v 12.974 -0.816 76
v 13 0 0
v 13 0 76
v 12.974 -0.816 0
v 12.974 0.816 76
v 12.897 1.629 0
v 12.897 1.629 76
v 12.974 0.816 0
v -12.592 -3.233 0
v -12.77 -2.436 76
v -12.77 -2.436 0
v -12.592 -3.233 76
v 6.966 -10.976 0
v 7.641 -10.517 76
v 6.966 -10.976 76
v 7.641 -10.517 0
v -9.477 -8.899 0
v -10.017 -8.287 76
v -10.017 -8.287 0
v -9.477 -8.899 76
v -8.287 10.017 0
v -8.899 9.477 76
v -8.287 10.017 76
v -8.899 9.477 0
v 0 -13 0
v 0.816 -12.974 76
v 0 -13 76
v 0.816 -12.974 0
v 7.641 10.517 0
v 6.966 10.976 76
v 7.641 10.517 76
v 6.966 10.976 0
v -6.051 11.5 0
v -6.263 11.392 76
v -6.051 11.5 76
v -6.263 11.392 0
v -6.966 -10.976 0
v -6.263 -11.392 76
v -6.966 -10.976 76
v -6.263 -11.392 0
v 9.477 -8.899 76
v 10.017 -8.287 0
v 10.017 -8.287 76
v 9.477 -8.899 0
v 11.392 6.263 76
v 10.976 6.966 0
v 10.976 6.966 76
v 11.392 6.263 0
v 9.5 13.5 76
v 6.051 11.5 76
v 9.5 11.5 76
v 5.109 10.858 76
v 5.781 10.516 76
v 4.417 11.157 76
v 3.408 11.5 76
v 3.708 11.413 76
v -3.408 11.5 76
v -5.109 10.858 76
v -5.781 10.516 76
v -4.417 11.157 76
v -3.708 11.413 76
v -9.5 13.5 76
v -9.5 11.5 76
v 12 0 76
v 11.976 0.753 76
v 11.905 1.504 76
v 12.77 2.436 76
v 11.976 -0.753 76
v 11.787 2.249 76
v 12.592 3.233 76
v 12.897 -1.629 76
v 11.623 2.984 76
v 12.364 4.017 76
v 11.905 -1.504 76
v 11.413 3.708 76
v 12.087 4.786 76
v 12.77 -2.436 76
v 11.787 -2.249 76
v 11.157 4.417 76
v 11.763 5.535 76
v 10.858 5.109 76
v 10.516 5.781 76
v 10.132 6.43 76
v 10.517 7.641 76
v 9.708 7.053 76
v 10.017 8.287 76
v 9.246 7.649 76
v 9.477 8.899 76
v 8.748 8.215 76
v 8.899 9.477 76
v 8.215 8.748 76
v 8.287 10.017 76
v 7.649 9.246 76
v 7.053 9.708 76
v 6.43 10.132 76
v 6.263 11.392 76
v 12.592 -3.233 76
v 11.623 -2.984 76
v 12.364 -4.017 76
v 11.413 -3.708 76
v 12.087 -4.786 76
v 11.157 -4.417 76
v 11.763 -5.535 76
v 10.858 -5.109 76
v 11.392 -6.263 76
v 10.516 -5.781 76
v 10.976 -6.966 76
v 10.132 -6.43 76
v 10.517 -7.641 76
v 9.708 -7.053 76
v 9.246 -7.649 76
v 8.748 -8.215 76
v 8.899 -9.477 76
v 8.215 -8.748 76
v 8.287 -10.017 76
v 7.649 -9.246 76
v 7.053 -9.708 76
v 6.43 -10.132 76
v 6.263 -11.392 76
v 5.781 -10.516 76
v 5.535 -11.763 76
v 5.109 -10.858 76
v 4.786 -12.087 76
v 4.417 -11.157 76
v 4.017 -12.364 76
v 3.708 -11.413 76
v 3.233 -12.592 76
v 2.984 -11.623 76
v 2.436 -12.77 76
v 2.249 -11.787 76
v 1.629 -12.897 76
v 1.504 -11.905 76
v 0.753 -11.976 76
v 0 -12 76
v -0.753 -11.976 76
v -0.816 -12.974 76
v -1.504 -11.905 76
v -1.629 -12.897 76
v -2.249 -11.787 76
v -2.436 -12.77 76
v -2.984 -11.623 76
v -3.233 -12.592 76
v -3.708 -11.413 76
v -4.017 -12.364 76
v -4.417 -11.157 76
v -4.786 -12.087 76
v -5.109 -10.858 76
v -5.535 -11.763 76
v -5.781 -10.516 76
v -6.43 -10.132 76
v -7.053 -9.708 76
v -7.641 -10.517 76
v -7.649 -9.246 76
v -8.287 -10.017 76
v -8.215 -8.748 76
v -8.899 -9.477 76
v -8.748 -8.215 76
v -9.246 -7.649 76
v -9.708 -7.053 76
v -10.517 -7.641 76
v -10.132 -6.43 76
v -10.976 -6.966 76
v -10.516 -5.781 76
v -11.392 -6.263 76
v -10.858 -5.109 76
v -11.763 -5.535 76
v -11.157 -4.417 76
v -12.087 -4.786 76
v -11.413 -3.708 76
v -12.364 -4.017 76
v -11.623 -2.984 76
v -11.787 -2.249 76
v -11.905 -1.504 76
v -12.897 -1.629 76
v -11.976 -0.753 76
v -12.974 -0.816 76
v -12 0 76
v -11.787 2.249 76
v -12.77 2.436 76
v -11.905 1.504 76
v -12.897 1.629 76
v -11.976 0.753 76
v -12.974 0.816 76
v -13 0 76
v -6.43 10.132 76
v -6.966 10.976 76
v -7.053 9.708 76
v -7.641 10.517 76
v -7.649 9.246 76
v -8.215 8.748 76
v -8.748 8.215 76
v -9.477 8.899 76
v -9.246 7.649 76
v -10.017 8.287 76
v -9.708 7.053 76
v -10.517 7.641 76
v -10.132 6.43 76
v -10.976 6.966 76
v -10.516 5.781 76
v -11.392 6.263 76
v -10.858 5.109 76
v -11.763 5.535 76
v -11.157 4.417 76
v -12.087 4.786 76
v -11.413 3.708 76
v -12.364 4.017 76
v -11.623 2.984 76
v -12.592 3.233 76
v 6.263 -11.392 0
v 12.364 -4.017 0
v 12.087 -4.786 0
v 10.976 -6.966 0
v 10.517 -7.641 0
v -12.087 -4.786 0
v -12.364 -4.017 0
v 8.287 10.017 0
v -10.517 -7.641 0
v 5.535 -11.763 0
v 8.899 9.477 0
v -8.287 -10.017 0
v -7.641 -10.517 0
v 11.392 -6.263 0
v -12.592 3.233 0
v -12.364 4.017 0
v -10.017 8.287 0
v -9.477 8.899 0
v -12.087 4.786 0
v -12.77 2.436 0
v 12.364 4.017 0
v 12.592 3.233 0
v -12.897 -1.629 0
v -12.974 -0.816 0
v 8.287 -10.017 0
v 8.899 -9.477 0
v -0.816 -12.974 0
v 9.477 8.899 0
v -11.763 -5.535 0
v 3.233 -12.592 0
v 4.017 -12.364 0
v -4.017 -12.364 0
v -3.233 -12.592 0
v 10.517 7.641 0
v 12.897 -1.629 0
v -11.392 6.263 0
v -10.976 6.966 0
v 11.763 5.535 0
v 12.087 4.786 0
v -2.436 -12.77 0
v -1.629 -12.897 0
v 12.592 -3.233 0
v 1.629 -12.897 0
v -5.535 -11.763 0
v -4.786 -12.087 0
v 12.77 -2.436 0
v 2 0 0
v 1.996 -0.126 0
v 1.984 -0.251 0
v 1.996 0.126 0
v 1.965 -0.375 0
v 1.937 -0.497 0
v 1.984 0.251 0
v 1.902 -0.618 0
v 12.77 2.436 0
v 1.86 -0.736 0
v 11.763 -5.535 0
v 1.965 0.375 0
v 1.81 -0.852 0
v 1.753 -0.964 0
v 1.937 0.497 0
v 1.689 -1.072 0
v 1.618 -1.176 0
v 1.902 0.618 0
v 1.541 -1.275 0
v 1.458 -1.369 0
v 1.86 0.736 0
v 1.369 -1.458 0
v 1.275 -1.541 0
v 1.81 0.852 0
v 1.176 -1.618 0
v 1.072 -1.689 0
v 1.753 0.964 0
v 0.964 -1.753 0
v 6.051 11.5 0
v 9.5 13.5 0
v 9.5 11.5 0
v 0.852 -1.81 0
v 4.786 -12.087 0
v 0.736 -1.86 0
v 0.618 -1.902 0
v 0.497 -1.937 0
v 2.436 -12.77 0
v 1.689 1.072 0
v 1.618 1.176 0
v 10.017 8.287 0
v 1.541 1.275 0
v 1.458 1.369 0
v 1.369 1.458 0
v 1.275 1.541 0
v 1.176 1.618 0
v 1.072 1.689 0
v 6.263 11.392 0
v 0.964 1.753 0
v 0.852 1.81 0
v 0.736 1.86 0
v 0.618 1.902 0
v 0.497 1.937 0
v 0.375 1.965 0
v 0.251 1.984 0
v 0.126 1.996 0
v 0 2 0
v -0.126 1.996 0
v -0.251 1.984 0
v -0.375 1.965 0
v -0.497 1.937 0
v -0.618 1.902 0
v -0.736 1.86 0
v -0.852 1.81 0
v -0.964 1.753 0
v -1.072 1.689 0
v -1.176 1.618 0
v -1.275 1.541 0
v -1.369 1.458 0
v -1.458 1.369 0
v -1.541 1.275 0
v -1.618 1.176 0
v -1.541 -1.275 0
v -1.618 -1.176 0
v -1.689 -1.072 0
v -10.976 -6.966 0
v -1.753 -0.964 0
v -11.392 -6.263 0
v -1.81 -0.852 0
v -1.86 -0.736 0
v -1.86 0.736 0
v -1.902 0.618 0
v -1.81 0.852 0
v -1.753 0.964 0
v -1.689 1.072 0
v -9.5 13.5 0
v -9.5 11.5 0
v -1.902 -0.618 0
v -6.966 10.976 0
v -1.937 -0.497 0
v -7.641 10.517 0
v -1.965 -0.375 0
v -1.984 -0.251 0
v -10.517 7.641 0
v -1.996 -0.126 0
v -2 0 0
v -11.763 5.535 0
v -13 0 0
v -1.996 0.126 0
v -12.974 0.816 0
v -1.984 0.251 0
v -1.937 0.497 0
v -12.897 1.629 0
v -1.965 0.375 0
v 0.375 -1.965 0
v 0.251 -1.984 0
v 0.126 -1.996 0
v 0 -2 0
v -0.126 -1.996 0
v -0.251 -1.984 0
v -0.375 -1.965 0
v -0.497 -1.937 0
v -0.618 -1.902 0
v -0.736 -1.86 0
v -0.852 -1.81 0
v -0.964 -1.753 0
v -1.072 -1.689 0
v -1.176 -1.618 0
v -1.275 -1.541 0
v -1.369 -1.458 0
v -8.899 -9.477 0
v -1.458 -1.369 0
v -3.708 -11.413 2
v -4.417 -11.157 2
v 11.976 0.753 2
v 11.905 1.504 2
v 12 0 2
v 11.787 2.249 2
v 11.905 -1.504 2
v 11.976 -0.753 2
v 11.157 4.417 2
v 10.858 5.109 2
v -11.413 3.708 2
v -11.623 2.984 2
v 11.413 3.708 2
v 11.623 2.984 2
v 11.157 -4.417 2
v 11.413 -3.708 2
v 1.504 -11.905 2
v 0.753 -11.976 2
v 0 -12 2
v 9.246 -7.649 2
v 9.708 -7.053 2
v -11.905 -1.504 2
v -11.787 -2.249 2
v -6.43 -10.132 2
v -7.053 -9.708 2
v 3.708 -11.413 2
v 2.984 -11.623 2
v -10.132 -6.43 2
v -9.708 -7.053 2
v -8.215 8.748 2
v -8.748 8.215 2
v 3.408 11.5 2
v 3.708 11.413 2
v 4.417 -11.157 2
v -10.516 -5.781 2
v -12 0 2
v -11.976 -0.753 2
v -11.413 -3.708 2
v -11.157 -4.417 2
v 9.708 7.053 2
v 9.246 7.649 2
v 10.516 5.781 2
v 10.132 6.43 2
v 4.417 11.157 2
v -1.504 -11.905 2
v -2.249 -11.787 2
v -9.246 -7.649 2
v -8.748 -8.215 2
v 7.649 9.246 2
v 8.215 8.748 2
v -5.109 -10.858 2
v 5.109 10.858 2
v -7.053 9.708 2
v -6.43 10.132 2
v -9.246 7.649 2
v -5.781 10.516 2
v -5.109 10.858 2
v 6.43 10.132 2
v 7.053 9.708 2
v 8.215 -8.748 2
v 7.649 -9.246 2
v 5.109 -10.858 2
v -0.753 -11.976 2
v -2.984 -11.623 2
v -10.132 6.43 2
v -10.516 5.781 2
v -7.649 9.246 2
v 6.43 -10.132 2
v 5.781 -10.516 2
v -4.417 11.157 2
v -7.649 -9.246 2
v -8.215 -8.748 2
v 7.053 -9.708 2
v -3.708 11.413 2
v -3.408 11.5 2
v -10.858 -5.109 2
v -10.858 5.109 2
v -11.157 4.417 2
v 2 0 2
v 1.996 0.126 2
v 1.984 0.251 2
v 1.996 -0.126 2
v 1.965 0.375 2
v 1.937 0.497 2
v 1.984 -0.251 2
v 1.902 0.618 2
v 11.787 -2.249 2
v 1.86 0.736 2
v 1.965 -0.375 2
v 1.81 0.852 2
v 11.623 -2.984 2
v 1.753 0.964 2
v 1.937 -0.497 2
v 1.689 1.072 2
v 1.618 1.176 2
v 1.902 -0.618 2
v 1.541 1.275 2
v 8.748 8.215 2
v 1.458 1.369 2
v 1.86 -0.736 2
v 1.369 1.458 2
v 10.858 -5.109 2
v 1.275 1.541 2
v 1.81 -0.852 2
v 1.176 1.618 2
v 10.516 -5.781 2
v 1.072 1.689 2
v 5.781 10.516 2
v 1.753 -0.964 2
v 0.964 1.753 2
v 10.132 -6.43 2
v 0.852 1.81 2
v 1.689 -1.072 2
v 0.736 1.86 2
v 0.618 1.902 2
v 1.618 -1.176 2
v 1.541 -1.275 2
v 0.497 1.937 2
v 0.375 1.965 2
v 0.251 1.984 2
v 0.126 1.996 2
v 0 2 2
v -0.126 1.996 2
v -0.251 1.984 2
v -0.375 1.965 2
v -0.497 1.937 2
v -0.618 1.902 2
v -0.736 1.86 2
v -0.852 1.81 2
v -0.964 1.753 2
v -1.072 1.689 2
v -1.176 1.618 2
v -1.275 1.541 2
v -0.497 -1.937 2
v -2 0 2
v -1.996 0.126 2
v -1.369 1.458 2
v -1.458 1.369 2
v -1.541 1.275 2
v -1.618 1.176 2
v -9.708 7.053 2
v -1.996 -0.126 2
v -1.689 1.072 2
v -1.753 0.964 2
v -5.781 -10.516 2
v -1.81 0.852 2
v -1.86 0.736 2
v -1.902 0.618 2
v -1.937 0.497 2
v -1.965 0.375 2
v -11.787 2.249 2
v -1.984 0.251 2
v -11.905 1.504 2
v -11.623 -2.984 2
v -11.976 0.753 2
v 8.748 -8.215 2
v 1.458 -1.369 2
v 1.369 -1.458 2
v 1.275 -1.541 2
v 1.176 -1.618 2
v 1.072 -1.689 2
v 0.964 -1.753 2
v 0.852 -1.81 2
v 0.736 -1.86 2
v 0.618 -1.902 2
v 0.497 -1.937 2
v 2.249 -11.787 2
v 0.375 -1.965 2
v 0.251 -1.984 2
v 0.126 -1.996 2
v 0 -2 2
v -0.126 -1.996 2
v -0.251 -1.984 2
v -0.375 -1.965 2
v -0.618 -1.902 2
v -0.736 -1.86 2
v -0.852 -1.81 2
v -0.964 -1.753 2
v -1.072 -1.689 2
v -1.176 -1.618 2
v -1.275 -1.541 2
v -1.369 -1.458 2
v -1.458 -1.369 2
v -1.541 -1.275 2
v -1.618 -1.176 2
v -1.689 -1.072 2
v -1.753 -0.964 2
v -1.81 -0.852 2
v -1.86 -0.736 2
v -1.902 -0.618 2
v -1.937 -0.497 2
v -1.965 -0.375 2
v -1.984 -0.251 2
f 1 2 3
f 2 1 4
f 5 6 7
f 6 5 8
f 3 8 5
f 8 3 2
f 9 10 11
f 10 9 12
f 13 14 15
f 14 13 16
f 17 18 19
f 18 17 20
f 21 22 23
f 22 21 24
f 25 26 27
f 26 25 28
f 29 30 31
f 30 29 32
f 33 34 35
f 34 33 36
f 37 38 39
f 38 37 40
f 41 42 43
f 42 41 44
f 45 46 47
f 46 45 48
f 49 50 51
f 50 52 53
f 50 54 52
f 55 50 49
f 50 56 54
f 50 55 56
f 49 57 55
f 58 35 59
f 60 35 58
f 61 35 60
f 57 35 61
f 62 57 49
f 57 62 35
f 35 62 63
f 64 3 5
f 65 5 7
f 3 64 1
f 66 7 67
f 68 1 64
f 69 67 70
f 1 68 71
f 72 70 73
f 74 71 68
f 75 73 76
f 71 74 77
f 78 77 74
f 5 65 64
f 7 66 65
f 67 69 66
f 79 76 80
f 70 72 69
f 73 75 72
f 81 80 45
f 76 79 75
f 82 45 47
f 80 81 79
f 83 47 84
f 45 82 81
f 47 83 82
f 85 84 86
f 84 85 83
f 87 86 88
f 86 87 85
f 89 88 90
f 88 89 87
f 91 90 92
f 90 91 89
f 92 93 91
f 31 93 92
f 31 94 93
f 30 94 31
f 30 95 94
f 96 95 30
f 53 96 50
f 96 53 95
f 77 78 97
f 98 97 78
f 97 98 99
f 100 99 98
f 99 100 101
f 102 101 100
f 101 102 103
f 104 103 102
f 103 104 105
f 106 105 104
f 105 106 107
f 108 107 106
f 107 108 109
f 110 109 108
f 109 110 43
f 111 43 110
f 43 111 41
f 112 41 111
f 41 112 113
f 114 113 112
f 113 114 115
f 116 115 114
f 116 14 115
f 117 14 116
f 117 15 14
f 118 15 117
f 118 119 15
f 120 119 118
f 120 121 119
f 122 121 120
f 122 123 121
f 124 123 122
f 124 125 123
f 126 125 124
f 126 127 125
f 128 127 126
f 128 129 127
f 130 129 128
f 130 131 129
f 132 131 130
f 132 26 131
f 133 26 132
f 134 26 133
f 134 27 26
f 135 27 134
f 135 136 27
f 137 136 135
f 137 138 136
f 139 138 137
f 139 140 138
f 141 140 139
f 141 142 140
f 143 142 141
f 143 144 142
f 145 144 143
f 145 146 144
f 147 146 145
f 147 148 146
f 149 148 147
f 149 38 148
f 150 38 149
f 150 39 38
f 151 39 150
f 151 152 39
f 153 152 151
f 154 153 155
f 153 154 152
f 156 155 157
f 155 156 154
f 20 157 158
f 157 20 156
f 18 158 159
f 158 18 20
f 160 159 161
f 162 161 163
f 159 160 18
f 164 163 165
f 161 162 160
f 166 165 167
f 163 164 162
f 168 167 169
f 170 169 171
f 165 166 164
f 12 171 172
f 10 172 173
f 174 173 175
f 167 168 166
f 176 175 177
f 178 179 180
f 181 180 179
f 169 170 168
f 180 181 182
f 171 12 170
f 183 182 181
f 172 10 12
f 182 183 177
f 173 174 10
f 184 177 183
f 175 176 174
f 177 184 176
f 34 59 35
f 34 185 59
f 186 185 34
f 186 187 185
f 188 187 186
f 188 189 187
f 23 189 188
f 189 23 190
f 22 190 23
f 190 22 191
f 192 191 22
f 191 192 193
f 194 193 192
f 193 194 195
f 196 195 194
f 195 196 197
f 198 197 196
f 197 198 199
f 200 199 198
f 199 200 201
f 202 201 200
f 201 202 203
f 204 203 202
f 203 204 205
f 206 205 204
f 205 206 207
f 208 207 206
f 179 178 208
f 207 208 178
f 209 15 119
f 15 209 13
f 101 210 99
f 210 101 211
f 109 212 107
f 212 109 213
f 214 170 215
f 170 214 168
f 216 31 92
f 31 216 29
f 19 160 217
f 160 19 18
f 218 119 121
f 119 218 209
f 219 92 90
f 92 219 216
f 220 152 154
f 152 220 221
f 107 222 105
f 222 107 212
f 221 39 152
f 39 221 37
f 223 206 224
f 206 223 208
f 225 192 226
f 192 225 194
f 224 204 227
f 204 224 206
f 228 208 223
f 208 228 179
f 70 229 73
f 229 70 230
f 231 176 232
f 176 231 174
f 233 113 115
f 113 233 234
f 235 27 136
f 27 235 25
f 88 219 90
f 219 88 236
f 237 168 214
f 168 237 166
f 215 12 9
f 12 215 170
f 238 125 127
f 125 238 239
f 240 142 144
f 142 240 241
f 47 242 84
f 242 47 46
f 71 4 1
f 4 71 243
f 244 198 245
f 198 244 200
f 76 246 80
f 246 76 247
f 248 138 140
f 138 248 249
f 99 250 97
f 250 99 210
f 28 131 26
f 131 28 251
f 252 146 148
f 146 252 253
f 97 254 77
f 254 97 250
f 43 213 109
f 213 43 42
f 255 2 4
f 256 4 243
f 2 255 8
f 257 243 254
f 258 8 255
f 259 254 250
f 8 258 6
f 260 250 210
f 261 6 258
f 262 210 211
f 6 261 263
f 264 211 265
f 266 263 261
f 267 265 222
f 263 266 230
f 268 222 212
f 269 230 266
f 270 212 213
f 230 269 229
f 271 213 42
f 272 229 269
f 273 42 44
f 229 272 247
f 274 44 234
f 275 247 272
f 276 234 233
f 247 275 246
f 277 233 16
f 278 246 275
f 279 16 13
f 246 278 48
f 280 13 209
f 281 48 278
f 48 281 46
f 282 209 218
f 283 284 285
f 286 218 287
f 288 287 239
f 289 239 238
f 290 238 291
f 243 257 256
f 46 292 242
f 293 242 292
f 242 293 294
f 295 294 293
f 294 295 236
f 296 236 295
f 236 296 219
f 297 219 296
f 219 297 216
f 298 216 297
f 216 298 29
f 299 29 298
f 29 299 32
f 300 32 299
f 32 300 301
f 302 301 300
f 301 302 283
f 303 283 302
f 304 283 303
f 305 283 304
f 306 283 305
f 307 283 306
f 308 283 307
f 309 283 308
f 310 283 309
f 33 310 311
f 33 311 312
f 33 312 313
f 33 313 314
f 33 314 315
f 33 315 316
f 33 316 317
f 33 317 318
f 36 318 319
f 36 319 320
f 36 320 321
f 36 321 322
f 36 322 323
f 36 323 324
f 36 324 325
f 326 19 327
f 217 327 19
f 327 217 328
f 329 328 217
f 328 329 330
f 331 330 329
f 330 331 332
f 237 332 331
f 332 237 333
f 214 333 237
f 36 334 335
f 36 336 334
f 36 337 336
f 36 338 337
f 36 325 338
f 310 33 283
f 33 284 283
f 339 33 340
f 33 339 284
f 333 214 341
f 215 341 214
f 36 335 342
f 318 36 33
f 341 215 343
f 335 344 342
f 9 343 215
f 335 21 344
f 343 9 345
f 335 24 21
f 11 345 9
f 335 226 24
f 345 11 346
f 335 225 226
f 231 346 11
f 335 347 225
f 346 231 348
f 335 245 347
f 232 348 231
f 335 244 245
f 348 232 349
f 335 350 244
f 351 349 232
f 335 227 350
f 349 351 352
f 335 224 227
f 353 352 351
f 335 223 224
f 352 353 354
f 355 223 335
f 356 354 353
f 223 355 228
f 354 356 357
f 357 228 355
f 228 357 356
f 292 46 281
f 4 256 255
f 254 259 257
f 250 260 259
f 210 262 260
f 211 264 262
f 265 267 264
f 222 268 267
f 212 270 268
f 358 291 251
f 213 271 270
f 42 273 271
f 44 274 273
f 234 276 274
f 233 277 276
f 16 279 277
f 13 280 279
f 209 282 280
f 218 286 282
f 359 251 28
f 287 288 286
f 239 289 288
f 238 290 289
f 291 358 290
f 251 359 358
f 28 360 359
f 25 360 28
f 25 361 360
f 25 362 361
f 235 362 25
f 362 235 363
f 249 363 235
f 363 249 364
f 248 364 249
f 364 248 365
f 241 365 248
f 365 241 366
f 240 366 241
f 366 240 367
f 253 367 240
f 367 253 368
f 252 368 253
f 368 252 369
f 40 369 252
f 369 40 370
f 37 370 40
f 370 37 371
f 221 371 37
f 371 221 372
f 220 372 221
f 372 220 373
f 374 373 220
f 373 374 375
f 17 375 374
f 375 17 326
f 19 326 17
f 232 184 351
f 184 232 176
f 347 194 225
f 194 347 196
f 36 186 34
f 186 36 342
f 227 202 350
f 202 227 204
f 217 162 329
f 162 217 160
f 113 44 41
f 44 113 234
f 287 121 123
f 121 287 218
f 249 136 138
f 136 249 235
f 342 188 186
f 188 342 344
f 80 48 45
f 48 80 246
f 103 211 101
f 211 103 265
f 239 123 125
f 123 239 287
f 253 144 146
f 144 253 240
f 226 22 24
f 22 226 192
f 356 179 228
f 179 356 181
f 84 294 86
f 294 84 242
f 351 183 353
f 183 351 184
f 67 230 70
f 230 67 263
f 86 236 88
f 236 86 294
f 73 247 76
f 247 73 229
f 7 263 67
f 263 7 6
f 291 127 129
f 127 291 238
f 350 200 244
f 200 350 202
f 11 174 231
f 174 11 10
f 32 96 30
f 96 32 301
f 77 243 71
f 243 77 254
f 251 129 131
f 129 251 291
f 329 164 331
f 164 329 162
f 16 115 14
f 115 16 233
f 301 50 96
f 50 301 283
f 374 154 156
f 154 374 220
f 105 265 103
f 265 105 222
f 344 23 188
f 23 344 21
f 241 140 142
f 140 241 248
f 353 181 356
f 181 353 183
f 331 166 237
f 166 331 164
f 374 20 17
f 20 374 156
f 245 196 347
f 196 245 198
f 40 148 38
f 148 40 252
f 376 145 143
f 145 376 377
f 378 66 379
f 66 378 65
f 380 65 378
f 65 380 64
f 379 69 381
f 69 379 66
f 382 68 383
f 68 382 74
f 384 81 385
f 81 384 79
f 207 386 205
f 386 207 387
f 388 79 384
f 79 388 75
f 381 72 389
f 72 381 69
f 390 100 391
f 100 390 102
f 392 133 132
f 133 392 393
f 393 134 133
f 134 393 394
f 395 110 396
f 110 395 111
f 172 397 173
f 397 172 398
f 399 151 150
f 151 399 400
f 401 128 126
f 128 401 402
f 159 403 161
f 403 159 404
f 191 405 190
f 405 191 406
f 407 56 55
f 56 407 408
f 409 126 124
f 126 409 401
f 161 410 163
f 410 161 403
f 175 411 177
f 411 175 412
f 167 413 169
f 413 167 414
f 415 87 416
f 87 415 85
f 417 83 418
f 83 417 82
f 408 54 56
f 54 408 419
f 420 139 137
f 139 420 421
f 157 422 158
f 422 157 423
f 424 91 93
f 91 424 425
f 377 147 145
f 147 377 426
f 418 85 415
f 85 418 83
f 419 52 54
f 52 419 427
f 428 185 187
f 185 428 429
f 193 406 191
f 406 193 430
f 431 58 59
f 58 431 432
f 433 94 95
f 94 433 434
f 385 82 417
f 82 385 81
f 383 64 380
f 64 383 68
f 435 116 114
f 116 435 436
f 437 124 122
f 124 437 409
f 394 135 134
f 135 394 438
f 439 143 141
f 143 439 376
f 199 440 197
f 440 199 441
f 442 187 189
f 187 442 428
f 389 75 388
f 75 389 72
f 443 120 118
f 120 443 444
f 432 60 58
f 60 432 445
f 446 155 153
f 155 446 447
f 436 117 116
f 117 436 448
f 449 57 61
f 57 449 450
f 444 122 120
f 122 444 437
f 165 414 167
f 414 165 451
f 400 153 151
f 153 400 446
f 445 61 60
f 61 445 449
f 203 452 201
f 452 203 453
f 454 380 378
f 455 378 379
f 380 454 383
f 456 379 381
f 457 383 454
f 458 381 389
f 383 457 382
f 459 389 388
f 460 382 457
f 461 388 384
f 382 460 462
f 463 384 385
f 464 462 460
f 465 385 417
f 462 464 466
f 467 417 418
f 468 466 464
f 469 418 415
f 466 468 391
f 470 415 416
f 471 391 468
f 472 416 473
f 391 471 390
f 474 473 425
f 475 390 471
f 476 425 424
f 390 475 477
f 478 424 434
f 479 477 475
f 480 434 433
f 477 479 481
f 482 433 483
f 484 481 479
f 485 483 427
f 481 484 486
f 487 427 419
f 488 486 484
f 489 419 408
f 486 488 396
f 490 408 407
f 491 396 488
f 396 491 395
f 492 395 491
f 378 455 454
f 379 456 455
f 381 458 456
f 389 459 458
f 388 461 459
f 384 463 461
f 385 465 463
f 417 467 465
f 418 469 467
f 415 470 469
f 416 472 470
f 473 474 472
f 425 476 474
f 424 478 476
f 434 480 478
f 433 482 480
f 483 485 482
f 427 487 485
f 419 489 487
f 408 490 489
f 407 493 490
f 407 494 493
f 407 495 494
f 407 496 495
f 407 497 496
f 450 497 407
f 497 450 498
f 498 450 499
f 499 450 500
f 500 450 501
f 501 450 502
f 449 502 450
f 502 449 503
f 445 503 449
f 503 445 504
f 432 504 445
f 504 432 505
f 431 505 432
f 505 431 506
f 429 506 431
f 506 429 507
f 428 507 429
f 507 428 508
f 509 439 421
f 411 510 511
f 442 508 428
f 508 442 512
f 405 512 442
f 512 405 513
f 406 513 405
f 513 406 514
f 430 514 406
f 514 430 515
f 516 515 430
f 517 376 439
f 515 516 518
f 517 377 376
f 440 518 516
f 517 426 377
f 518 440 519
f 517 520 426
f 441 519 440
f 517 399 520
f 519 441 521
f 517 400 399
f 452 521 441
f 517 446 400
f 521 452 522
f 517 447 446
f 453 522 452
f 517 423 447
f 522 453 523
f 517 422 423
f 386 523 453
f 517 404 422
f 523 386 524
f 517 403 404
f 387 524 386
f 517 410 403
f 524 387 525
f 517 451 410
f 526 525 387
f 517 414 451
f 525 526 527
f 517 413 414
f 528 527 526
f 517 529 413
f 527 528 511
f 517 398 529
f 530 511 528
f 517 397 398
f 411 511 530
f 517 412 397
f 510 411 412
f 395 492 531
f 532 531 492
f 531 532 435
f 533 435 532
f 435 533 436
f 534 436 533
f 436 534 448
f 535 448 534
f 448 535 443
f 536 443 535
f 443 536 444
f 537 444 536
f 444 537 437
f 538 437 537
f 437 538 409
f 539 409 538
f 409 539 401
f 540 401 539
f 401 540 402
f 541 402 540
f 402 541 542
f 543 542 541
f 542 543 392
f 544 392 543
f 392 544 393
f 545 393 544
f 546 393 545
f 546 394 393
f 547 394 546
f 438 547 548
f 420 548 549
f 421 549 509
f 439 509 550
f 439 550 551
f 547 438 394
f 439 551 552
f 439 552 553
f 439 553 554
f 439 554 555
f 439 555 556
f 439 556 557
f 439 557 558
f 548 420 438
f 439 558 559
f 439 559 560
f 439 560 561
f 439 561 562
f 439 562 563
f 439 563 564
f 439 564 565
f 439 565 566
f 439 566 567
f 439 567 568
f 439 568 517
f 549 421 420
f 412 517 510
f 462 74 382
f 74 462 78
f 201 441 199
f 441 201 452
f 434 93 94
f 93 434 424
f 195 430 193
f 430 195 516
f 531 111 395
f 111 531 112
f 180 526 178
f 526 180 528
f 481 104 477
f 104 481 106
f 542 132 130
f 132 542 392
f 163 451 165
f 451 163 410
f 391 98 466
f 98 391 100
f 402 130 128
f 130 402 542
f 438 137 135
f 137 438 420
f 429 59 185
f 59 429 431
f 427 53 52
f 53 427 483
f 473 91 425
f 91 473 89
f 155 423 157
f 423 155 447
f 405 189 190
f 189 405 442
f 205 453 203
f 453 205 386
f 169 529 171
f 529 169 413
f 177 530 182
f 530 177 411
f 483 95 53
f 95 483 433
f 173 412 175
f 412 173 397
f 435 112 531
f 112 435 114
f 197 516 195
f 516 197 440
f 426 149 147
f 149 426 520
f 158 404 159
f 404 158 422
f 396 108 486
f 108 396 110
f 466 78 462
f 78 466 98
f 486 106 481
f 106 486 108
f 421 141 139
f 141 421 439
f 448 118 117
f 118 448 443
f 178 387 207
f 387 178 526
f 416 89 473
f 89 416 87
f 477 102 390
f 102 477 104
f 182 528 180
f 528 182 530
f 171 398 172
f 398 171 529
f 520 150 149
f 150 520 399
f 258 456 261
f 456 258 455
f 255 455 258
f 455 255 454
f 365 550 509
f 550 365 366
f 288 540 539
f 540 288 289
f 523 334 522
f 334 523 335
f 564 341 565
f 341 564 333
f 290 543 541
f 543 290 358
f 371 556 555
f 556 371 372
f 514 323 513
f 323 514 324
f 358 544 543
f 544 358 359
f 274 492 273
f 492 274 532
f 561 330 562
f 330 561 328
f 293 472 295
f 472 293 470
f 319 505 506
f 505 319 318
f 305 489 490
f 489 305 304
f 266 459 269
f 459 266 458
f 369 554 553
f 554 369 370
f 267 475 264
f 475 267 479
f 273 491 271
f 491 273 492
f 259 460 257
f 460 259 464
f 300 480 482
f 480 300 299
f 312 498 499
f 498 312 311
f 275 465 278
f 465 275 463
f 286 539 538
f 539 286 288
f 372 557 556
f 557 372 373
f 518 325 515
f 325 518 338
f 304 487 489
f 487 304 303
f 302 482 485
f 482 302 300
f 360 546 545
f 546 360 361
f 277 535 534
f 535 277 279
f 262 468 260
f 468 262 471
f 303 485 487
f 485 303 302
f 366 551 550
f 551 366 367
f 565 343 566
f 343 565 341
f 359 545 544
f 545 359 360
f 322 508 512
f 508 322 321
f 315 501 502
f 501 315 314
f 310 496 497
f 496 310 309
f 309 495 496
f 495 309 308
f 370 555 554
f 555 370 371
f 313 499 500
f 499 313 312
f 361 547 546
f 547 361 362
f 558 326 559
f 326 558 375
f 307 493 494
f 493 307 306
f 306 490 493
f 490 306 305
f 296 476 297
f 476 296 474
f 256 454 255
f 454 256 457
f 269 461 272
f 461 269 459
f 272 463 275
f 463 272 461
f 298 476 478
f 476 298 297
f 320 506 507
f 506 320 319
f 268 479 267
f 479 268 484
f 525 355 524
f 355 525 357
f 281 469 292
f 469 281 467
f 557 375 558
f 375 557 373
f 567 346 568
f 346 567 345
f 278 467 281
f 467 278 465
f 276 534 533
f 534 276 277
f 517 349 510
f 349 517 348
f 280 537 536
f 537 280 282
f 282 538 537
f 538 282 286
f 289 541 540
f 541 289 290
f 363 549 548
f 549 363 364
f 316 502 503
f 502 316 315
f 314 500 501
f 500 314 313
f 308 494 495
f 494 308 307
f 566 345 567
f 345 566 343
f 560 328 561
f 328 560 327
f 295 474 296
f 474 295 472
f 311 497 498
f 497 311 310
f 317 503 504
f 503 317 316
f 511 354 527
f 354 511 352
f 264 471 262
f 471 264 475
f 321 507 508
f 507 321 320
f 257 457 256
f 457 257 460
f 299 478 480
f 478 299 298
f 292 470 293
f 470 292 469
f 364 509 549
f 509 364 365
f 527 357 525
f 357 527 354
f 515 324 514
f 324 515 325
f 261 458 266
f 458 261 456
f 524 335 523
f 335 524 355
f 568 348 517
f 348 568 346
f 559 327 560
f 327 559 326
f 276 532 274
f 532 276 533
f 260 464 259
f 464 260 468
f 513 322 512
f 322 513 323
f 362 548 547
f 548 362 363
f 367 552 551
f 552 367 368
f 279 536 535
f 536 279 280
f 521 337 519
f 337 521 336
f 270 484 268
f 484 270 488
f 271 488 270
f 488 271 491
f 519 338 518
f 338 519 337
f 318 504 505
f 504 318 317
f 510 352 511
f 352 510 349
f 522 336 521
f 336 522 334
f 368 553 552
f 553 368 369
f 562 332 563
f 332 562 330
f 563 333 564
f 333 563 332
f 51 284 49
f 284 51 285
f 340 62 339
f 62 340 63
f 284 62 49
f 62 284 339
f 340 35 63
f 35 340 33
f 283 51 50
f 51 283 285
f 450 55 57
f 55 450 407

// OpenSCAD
$fn=100;

difference()
{
difference()
{
  cylinder(76,13,13);
  translate ([0,0,2]) cylinder(76,12,12);

}
cylinder(6,2,2, center = true);
}

translate([0,12.5,38]) cube([19,2,76], center = true);
